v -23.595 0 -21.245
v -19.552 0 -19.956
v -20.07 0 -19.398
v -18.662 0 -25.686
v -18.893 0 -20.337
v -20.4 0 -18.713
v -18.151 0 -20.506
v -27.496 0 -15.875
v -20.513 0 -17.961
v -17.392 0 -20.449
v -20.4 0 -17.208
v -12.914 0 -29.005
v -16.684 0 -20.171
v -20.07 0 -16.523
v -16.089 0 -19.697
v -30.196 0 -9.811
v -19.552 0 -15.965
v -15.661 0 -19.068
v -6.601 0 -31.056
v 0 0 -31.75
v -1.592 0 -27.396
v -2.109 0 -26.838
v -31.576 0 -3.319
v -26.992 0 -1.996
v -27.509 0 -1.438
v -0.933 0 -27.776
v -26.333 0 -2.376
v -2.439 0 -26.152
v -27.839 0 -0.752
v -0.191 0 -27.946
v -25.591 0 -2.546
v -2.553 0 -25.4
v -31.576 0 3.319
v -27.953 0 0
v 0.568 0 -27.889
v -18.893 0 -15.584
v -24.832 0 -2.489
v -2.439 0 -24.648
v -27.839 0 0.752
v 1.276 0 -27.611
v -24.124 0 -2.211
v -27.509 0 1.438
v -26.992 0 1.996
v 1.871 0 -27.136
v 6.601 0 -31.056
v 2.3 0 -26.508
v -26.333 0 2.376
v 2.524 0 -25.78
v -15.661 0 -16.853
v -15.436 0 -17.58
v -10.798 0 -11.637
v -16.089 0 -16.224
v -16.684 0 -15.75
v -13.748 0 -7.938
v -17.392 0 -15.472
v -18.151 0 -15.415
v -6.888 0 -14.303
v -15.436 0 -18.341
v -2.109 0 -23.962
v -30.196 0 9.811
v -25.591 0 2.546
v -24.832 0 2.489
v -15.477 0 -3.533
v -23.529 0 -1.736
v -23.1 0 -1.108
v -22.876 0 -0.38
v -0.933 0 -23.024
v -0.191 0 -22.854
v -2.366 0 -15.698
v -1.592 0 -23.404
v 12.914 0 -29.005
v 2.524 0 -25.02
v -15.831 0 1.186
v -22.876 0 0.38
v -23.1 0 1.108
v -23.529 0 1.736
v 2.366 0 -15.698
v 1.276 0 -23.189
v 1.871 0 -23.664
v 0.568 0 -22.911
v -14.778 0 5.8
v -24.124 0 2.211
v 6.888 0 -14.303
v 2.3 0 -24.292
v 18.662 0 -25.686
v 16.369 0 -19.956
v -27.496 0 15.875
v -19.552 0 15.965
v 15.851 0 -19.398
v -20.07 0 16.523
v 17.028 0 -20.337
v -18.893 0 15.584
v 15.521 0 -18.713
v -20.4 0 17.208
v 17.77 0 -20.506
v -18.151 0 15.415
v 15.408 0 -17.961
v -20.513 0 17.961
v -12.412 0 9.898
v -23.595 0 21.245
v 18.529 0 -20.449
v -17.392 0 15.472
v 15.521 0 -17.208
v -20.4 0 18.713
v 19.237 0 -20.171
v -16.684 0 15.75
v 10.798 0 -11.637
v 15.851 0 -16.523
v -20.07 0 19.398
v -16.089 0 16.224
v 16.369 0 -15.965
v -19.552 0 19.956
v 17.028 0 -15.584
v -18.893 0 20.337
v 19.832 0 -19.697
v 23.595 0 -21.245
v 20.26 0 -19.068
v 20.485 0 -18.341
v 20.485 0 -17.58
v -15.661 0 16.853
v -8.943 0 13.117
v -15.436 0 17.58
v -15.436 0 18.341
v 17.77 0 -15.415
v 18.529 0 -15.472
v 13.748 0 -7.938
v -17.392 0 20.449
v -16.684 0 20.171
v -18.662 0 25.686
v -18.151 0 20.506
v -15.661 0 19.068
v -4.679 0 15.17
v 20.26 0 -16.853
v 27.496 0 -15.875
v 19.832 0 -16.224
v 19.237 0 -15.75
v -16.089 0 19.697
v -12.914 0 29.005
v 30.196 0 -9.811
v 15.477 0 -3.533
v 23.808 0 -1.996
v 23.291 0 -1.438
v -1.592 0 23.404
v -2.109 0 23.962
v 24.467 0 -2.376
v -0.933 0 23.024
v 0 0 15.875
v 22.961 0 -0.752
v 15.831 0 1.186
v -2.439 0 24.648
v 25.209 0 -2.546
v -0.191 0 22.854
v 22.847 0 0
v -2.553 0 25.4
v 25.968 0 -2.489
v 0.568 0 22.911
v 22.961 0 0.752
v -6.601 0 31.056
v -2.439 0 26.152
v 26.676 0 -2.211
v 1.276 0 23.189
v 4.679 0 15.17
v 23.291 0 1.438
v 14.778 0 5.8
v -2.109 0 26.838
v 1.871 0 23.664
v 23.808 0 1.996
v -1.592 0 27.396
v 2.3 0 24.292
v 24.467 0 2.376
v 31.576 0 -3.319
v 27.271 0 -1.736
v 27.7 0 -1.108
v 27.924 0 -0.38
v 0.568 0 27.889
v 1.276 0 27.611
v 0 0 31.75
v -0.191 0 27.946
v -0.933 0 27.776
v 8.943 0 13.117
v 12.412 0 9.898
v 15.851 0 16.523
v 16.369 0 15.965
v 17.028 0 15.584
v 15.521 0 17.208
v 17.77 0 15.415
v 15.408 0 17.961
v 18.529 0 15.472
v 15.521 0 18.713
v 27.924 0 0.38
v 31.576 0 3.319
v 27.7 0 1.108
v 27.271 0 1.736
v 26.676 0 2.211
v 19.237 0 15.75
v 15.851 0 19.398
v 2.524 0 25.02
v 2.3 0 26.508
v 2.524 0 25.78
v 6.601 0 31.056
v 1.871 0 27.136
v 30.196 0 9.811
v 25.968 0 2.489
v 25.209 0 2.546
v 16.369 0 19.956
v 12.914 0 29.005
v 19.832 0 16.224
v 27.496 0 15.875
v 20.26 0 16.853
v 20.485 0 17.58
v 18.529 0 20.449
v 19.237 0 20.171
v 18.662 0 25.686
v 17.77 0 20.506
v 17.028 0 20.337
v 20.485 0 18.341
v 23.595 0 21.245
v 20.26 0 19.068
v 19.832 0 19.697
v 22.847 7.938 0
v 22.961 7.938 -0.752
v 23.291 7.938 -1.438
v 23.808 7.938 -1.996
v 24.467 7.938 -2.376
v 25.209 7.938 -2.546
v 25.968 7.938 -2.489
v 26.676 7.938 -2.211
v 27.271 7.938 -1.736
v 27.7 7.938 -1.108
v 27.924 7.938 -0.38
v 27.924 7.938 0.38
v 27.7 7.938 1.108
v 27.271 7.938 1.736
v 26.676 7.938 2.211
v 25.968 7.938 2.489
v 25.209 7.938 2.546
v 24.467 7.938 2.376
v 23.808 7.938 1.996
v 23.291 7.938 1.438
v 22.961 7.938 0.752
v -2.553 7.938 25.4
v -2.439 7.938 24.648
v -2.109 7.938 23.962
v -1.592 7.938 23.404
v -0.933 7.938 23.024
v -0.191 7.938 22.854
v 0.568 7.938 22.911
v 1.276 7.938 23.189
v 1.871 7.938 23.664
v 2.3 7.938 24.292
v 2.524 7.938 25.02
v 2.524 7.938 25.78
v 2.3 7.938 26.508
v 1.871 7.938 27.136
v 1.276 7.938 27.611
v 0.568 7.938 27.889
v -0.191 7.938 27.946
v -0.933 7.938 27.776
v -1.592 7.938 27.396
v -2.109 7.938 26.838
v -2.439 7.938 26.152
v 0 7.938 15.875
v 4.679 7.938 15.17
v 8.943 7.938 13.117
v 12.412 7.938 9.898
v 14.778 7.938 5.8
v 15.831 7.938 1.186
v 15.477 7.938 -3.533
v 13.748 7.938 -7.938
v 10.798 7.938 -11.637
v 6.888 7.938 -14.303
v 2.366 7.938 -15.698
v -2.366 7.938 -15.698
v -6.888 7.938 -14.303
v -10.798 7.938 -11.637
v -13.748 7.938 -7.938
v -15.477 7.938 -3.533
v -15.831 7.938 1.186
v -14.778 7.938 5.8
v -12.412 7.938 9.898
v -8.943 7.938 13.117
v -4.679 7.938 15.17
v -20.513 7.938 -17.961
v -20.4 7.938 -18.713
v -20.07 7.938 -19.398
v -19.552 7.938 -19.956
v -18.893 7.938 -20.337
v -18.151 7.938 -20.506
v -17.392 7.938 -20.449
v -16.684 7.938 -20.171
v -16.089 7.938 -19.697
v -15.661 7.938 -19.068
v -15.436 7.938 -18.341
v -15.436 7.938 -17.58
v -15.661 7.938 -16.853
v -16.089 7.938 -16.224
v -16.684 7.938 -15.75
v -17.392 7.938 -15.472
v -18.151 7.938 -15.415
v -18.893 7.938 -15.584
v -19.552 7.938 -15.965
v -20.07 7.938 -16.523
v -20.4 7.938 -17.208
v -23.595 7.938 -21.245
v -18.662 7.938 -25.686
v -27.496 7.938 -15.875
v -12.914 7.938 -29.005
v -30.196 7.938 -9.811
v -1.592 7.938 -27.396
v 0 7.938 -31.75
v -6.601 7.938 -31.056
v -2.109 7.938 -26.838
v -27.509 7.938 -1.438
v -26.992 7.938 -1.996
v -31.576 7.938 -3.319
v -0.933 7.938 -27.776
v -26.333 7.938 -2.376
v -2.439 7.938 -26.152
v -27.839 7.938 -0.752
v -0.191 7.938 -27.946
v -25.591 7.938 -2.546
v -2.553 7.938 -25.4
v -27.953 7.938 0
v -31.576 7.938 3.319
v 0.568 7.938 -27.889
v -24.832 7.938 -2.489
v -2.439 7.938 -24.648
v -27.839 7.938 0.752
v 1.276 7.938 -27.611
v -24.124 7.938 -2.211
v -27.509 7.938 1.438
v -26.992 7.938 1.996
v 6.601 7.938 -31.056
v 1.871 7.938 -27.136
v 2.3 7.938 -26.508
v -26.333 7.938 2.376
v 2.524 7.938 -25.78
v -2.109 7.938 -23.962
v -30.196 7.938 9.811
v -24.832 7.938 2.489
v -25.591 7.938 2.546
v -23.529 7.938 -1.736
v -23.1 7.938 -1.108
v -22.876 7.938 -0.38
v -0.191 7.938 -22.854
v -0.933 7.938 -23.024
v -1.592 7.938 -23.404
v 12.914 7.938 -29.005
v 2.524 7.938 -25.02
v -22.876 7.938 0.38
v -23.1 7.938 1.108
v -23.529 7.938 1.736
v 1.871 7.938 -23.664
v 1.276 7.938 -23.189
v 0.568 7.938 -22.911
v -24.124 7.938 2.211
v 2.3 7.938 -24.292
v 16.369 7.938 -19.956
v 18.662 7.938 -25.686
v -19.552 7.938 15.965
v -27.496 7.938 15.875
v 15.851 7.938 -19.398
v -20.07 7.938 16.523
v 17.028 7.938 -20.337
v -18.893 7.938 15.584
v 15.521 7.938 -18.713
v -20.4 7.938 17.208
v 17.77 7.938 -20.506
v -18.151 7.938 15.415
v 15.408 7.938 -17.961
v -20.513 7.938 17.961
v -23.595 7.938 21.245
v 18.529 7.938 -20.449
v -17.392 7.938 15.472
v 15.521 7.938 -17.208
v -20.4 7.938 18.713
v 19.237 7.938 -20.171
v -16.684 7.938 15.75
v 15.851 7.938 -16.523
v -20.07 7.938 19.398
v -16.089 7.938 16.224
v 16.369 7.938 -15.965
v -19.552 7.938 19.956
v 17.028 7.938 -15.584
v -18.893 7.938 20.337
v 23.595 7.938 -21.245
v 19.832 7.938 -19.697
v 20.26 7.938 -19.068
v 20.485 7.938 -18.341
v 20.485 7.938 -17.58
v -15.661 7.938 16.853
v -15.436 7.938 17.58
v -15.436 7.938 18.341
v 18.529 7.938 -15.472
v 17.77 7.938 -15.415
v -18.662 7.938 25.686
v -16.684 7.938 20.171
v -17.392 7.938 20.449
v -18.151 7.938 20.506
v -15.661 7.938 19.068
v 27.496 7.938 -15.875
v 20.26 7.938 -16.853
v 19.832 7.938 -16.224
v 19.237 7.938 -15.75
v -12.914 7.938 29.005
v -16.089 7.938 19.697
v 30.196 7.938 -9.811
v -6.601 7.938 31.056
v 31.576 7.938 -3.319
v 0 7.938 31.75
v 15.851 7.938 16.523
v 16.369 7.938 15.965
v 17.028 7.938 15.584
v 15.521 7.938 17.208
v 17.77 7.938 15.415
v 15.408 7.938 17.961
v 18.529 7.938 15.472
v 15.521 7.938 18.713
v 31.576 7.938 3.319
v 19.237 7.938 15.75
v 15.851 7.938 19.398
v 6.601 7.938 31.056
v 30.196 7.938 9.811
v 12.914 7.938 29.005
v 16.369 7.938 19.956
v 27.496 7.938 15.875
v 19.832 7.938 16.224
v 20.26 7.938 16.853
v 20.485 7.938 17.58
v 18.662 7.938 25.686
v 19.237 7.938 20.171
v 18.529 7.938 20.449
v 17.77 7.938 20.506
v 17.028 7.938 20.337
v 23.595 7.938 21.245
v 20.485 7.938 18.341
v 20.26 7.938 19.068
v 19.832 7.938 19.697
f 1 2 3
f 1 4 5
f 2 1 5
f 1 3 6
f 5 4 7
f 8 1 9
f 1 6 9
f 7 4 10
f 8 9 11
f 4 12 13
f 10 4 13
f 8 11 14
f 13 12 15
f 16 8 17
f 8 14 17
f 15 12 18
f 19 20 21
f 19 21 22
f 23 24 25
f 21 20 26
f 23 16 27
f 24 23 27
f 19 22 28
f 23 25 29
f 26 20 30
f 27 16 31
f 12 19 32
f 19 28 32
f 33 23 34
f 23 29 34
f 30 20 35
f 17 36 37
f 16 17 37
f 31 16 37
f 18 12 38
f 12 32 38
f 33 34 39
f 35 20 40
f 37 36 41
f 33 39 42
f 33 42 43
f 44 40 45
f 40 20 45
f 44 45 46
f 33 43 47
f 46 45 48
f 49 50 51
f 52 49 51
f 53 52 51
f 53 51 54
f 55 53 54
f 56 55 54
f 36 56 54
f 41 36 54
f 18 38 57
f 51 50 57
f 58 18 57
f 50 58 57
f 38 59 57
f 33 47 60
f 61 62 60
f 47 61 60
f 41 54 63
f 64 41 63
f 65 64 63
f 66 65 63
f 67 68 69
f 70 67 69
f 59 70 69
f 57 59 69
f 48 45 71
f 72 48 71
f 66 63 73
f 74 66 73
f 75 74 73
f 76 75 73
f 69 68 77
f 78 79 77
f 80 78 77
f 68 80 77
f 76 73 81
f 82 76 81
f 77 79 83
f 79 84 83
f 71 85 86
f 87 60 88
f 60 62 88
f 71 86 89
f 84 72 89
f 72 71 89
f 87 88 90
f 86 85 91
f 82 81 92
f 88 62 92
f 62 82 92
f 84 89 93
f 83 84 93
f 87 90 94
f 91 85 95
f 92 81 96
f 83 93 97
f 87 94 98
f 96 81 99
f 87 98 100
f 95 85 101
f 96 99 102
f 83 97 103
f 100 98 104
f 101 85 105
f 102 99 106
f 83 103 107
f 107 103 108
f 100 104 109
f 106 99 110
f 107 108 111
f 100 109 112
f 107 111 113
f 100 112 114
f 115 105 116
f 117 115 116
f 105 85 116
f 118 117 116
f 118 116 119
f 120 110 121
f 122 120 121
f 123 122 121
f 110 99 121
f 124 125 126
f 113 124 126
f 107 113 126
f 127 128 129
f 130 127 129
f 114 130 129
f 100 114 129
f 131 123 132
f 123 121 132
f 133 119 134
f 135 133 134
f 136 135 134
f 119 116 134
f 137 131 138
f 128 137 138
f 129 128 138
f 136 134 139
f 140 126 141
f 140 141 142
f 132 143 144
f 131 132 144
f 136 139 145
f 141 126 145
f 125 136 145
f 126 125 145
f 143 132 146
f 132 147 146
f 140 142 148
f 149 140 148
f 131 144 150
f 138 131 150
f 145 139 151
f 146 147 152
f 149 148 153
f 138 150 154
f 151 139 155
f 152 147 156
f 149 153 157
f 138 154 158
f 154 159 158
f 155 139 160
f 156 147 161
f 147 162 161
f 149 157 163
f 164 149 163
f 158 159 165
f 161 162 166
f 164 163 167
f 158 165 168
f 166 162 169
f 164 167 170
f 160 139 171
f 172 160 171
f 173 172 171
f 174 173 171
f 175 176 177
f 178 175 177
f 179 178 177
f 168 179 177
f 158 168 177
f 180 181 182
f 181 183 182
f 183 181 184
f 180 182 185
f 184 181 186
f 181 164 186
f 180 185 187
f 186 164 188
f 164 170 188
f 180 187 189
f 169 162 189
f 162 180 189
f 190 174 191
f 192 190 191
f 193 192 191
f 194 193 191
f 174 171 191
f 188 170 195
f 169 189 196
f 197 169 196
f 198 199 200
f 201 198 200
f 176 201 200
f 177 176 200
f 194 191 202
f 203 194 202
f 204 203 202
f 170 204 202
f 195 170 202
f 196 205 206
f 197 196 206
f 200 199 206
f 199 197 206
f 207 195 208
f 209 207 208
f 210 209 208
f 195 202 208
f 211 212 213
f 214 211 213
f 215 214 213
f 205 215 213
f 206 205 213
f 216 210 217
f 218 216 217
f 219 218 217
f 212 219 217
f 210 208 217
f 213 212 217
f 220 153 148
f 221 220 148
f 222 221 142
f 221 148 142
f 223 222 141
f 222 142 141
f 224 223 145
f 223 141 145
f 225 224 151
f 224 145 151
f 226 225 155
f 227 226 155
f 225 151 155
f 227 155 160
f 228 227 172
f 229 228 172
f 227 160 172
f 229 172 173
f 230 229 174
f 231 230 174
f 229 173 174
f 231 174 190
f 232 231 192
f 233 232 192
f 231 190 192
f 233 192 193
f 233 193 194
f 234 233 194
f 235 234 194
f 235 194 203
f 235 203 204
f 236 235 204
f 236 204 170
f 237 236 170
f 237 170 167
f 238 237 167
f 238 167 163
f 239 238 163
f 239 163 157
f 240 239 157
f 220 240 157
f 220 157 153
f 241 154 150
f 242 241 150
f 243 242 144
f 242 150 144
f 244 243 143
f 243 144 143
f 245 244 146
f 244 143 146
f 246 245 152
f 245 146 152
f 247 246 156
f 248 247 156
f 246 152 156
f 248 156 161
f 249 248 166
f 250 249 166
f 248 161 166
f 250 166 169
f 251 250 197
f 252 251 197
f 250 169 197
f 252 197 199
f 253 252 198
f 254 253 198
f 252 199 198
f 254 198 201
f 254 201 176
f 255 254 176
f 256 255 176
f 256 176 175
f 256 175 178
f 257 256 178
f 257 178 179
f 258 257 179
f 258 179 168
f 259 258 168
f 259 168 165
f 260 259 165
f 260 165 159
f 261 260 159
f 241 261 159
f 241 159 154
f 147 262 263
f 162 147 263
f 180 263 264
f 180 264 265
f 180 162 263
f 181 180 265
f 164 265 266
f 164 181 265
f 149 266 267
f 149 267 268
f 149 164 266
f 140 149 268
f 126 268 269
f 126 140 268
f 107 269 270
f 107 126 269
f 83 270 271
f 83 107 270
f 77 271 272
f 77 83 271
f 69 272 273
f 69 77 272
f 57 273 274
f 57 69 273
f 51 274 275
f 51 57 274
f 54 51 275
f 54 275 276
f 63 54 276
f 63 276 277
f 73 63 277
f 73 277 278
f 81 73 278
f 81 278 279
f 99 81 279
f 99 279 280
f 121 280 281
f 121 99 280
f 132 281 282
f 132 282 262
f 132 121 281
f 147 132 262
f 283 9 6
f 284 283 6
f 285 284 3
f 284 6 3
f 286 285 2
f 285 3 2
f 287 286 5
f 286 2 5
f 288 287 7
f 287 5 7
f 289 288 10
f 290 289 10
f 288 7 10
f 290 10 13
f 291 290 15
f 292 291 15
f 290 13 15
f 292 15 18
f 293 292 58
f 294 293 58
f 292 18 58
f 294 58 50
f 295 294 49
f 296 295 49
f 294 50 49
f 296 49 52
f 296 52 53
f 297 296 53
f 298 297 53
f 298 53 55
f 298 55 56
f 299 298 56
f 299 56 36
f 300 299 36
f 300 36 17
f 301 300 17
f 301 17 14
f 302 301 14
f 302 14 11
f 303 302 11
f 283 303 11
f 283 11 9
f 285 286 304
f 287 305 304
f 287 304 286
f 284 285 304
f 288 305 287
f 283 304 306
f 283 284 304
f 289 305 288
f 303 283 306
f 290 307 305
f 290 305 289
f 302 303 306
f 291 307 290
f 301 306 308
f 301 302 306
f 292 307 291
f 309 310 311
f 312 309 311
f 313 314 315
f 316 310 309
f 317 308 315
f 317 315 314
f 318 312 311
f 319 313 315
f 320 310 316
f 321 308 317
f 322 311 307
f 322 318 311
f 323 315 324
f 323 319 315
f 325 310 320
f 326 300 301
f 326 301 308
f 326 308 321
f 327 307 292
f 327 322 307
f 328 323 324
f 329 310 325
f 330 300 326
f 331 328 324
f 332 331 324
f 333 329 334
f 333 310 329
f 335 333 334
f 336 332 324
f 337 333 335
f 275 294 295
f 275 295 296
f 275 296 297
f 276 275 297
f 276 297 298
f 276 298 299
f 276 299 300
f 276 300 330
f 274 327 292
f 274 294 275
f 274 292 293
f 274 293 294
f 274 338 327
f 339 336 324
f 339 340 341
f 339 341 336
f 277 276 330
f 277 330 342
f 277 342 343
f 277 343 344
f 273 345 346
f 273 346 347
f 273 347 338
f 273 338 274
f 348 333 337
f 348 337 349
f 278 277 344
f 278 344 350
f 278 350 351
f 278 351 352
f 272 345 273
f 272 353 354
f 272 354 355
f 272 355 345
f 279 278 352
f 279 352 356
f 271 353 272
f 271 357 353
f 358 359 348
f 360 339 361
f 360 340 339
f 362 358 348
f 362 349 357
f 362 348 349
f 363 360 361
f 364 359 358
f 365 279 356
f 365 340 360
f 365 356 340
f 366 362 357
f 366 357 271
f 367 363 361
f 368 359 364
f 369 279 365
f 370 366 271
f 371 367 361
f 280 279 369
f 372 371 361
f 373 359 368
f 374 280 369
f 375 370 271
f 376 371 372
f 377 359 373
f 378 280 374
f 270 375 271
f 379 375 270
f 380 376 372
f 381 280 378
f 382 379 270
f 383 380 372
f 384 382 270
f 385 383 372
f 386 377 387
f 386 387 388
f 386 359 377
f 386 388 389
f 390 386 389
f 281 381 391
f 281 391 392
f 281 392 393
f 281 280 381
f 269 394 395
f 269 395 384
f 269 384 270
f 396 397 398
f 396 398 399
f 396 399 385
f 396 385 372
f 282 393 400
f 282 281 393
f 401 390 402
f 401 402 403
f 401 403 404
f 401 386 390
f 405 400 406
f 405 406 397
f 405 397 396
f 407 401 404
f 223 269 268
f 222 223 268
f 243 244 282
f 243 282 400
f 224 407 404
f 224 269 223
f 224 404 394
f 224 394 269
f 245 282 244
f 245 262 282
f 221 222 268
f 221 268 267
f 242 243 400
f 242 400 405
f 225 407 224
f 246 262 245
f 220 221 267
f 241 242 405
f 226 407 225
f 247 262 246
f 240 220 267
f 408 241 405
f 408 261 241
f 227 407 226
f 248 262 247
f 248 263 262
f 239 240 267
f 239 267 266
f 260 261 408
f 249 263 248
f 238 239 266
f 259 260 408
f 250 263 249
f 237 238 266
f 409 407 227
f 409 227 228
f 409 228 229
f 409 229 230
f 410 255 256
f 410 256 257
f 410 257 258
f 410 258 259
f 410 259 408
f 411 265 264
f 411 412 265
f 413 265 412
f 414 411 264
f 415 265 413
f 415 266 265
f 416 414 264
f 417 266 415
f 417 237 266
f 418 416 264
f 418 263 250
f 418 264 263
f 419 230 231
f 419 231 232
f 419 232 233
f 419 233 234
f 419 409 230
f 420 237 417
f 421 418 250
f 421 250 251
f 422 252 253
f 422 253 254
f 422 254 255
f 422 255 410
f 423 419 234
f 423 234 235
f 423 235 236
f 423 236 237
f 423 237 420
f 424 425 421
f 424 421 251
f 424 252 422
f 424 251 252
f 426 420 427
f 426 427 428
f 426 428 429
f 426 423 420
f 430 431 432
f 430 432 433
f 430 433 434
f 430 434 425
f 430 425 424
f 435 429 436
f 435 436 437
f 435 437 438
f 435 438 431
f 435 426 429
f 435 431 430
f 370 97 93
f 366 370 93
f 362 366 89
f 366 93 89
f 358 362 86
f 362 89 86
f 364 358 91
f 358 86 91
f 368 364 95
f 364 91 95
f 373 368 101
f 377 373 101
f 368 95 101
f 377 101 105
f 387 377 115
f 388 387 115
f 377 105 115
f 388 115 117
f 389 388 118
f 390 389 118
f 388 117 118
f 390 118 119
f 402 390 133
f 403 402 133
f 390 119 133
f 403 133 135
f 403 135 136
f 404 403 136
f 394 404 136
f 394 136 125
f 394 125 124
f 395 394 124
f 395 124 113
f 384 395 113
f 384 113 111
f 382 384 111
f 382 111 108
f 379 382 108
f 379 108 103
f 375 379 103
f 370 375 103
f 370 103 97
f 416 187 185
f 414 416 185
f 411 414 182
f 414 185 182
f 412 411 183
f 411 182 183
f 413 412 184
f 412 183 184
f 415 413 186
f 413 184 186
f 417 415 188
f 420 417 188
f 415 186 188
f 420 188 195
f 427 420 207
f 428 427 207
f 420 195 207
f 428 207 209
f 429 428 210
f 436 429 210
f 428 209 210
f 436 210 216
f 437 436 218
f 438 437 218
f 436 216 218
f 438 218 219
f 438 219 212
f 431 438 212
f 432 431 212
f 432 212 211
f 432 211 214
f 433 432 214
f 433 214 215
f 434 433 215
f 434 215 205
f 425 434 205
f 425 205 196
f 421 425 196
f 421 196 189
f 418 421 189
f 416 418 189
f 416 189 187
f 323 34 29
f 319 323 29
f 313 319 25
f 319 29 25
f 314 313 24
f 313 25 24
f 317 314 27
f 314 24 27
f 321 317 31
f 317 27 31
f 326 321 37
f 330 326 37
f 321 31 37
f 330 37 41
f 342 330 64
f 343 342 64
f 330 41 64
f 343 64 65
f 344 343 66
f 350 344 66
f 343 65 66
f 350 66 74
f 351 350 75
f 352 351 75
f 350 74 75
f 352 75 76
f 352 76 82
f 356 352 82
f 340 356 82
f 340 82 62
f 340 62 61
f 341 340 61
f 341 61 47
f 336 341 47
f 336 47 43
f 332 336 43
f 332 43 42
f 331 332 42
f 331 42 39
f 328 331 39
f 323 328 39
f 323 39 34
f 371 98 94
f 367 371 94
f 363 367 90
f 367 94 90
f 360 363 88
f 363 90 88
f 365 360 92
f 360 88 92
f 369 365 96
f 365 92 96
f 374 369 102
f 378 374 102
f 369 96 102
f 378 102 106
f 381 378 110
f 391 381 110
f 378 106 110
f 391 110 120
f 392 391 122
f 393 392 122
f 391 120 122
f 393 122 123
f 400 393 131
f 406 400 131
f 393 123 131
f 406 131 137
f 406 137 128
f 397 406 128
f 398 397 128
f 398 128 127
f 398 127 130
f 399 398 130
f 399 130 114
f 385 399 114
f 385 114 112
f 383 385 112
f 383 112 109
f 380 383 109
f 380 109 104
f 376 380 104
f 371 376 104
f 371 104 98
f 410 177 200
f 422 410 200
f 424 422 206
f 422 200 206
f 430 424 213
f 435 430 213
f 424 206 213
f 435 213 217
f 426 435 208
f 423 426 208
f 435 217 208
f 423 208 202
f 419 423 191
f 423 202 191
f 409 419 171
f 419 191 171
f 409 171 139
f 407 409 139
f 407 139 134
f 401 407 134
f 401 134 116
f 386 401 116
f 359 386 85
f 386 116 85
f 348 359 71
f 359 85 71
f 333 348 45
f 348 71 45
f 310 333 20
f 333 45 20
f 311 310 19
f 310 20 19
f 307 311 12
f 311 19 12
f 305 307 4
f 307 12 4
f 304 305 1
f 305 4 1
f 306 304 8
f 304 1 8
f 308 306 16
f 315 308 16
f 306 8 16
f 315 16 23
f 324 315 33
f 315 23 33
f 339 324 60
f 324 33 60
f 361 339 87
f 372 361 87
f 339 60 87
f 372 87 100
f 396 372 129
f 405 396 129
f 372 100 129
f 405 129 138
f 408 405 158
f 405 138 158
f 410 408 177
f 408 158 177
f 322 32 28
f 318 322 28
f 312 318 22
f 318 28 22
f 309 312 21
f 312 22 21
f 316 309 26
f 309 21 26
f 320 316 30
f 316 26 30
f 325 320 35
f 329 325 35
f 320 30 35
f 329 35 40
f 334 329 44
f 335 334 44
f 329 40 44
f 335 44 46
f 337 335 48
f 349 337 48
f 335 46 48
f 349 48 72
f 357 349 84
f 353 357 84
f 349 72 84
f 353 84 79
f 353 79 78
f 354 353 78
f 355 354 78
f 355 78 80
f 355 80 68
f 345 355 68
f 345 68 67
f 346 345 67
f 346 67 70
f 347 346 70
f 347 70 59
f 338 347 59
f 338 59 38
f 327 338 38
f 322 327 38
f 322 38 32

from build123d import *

# Parameters (mm, degrees)
SKETCH1_R              = 31.75
SKETCH1_R_2            = 15.875
BOSS_EXTRUDE1_DEPTH    = 7.9375
F_10_CLEARANCE_HOLE1_D = 5.1054


with BuildPart() as part:
    # Sketch1 → Boss-Extrude1 (new body)
    with BuildSketch(Plane(origin=(0, 0, 0), x_dir=(1, 0, 0), z_dir=(0, 1, 0))):
        with Locations(Location((0, 0, 0), (0, 0, 270))):
            Circle(SKETCH1_R)
        with Locations(Location((0, 0, 0), (0, 0, 270))):
            Circle(SKETCH1_R_2, mode=Mode.SUBTRACT)
    extrude(amount=BOSS_EXTRUDE1_DEPTH)

    # #10 Clearance Hole1 (through all)
    with Locations(Plane(origin=(0, 7.9375, 0), x_dir=(1, 0, 0), z_dir=(0, 1, 0))):
        with Locations((0, 25.4), (17.960512242, 17.960512242), (25.4, 0), (17.960512242, -17.960512242), (0, -25.4), (-17.960512242, -17.960512242), (-25.4, 0), (-17.960512242, 17.960512242)):
            Hole(F_10_CLEARANCE_HOLE1_D / 2)


solid = part.part
